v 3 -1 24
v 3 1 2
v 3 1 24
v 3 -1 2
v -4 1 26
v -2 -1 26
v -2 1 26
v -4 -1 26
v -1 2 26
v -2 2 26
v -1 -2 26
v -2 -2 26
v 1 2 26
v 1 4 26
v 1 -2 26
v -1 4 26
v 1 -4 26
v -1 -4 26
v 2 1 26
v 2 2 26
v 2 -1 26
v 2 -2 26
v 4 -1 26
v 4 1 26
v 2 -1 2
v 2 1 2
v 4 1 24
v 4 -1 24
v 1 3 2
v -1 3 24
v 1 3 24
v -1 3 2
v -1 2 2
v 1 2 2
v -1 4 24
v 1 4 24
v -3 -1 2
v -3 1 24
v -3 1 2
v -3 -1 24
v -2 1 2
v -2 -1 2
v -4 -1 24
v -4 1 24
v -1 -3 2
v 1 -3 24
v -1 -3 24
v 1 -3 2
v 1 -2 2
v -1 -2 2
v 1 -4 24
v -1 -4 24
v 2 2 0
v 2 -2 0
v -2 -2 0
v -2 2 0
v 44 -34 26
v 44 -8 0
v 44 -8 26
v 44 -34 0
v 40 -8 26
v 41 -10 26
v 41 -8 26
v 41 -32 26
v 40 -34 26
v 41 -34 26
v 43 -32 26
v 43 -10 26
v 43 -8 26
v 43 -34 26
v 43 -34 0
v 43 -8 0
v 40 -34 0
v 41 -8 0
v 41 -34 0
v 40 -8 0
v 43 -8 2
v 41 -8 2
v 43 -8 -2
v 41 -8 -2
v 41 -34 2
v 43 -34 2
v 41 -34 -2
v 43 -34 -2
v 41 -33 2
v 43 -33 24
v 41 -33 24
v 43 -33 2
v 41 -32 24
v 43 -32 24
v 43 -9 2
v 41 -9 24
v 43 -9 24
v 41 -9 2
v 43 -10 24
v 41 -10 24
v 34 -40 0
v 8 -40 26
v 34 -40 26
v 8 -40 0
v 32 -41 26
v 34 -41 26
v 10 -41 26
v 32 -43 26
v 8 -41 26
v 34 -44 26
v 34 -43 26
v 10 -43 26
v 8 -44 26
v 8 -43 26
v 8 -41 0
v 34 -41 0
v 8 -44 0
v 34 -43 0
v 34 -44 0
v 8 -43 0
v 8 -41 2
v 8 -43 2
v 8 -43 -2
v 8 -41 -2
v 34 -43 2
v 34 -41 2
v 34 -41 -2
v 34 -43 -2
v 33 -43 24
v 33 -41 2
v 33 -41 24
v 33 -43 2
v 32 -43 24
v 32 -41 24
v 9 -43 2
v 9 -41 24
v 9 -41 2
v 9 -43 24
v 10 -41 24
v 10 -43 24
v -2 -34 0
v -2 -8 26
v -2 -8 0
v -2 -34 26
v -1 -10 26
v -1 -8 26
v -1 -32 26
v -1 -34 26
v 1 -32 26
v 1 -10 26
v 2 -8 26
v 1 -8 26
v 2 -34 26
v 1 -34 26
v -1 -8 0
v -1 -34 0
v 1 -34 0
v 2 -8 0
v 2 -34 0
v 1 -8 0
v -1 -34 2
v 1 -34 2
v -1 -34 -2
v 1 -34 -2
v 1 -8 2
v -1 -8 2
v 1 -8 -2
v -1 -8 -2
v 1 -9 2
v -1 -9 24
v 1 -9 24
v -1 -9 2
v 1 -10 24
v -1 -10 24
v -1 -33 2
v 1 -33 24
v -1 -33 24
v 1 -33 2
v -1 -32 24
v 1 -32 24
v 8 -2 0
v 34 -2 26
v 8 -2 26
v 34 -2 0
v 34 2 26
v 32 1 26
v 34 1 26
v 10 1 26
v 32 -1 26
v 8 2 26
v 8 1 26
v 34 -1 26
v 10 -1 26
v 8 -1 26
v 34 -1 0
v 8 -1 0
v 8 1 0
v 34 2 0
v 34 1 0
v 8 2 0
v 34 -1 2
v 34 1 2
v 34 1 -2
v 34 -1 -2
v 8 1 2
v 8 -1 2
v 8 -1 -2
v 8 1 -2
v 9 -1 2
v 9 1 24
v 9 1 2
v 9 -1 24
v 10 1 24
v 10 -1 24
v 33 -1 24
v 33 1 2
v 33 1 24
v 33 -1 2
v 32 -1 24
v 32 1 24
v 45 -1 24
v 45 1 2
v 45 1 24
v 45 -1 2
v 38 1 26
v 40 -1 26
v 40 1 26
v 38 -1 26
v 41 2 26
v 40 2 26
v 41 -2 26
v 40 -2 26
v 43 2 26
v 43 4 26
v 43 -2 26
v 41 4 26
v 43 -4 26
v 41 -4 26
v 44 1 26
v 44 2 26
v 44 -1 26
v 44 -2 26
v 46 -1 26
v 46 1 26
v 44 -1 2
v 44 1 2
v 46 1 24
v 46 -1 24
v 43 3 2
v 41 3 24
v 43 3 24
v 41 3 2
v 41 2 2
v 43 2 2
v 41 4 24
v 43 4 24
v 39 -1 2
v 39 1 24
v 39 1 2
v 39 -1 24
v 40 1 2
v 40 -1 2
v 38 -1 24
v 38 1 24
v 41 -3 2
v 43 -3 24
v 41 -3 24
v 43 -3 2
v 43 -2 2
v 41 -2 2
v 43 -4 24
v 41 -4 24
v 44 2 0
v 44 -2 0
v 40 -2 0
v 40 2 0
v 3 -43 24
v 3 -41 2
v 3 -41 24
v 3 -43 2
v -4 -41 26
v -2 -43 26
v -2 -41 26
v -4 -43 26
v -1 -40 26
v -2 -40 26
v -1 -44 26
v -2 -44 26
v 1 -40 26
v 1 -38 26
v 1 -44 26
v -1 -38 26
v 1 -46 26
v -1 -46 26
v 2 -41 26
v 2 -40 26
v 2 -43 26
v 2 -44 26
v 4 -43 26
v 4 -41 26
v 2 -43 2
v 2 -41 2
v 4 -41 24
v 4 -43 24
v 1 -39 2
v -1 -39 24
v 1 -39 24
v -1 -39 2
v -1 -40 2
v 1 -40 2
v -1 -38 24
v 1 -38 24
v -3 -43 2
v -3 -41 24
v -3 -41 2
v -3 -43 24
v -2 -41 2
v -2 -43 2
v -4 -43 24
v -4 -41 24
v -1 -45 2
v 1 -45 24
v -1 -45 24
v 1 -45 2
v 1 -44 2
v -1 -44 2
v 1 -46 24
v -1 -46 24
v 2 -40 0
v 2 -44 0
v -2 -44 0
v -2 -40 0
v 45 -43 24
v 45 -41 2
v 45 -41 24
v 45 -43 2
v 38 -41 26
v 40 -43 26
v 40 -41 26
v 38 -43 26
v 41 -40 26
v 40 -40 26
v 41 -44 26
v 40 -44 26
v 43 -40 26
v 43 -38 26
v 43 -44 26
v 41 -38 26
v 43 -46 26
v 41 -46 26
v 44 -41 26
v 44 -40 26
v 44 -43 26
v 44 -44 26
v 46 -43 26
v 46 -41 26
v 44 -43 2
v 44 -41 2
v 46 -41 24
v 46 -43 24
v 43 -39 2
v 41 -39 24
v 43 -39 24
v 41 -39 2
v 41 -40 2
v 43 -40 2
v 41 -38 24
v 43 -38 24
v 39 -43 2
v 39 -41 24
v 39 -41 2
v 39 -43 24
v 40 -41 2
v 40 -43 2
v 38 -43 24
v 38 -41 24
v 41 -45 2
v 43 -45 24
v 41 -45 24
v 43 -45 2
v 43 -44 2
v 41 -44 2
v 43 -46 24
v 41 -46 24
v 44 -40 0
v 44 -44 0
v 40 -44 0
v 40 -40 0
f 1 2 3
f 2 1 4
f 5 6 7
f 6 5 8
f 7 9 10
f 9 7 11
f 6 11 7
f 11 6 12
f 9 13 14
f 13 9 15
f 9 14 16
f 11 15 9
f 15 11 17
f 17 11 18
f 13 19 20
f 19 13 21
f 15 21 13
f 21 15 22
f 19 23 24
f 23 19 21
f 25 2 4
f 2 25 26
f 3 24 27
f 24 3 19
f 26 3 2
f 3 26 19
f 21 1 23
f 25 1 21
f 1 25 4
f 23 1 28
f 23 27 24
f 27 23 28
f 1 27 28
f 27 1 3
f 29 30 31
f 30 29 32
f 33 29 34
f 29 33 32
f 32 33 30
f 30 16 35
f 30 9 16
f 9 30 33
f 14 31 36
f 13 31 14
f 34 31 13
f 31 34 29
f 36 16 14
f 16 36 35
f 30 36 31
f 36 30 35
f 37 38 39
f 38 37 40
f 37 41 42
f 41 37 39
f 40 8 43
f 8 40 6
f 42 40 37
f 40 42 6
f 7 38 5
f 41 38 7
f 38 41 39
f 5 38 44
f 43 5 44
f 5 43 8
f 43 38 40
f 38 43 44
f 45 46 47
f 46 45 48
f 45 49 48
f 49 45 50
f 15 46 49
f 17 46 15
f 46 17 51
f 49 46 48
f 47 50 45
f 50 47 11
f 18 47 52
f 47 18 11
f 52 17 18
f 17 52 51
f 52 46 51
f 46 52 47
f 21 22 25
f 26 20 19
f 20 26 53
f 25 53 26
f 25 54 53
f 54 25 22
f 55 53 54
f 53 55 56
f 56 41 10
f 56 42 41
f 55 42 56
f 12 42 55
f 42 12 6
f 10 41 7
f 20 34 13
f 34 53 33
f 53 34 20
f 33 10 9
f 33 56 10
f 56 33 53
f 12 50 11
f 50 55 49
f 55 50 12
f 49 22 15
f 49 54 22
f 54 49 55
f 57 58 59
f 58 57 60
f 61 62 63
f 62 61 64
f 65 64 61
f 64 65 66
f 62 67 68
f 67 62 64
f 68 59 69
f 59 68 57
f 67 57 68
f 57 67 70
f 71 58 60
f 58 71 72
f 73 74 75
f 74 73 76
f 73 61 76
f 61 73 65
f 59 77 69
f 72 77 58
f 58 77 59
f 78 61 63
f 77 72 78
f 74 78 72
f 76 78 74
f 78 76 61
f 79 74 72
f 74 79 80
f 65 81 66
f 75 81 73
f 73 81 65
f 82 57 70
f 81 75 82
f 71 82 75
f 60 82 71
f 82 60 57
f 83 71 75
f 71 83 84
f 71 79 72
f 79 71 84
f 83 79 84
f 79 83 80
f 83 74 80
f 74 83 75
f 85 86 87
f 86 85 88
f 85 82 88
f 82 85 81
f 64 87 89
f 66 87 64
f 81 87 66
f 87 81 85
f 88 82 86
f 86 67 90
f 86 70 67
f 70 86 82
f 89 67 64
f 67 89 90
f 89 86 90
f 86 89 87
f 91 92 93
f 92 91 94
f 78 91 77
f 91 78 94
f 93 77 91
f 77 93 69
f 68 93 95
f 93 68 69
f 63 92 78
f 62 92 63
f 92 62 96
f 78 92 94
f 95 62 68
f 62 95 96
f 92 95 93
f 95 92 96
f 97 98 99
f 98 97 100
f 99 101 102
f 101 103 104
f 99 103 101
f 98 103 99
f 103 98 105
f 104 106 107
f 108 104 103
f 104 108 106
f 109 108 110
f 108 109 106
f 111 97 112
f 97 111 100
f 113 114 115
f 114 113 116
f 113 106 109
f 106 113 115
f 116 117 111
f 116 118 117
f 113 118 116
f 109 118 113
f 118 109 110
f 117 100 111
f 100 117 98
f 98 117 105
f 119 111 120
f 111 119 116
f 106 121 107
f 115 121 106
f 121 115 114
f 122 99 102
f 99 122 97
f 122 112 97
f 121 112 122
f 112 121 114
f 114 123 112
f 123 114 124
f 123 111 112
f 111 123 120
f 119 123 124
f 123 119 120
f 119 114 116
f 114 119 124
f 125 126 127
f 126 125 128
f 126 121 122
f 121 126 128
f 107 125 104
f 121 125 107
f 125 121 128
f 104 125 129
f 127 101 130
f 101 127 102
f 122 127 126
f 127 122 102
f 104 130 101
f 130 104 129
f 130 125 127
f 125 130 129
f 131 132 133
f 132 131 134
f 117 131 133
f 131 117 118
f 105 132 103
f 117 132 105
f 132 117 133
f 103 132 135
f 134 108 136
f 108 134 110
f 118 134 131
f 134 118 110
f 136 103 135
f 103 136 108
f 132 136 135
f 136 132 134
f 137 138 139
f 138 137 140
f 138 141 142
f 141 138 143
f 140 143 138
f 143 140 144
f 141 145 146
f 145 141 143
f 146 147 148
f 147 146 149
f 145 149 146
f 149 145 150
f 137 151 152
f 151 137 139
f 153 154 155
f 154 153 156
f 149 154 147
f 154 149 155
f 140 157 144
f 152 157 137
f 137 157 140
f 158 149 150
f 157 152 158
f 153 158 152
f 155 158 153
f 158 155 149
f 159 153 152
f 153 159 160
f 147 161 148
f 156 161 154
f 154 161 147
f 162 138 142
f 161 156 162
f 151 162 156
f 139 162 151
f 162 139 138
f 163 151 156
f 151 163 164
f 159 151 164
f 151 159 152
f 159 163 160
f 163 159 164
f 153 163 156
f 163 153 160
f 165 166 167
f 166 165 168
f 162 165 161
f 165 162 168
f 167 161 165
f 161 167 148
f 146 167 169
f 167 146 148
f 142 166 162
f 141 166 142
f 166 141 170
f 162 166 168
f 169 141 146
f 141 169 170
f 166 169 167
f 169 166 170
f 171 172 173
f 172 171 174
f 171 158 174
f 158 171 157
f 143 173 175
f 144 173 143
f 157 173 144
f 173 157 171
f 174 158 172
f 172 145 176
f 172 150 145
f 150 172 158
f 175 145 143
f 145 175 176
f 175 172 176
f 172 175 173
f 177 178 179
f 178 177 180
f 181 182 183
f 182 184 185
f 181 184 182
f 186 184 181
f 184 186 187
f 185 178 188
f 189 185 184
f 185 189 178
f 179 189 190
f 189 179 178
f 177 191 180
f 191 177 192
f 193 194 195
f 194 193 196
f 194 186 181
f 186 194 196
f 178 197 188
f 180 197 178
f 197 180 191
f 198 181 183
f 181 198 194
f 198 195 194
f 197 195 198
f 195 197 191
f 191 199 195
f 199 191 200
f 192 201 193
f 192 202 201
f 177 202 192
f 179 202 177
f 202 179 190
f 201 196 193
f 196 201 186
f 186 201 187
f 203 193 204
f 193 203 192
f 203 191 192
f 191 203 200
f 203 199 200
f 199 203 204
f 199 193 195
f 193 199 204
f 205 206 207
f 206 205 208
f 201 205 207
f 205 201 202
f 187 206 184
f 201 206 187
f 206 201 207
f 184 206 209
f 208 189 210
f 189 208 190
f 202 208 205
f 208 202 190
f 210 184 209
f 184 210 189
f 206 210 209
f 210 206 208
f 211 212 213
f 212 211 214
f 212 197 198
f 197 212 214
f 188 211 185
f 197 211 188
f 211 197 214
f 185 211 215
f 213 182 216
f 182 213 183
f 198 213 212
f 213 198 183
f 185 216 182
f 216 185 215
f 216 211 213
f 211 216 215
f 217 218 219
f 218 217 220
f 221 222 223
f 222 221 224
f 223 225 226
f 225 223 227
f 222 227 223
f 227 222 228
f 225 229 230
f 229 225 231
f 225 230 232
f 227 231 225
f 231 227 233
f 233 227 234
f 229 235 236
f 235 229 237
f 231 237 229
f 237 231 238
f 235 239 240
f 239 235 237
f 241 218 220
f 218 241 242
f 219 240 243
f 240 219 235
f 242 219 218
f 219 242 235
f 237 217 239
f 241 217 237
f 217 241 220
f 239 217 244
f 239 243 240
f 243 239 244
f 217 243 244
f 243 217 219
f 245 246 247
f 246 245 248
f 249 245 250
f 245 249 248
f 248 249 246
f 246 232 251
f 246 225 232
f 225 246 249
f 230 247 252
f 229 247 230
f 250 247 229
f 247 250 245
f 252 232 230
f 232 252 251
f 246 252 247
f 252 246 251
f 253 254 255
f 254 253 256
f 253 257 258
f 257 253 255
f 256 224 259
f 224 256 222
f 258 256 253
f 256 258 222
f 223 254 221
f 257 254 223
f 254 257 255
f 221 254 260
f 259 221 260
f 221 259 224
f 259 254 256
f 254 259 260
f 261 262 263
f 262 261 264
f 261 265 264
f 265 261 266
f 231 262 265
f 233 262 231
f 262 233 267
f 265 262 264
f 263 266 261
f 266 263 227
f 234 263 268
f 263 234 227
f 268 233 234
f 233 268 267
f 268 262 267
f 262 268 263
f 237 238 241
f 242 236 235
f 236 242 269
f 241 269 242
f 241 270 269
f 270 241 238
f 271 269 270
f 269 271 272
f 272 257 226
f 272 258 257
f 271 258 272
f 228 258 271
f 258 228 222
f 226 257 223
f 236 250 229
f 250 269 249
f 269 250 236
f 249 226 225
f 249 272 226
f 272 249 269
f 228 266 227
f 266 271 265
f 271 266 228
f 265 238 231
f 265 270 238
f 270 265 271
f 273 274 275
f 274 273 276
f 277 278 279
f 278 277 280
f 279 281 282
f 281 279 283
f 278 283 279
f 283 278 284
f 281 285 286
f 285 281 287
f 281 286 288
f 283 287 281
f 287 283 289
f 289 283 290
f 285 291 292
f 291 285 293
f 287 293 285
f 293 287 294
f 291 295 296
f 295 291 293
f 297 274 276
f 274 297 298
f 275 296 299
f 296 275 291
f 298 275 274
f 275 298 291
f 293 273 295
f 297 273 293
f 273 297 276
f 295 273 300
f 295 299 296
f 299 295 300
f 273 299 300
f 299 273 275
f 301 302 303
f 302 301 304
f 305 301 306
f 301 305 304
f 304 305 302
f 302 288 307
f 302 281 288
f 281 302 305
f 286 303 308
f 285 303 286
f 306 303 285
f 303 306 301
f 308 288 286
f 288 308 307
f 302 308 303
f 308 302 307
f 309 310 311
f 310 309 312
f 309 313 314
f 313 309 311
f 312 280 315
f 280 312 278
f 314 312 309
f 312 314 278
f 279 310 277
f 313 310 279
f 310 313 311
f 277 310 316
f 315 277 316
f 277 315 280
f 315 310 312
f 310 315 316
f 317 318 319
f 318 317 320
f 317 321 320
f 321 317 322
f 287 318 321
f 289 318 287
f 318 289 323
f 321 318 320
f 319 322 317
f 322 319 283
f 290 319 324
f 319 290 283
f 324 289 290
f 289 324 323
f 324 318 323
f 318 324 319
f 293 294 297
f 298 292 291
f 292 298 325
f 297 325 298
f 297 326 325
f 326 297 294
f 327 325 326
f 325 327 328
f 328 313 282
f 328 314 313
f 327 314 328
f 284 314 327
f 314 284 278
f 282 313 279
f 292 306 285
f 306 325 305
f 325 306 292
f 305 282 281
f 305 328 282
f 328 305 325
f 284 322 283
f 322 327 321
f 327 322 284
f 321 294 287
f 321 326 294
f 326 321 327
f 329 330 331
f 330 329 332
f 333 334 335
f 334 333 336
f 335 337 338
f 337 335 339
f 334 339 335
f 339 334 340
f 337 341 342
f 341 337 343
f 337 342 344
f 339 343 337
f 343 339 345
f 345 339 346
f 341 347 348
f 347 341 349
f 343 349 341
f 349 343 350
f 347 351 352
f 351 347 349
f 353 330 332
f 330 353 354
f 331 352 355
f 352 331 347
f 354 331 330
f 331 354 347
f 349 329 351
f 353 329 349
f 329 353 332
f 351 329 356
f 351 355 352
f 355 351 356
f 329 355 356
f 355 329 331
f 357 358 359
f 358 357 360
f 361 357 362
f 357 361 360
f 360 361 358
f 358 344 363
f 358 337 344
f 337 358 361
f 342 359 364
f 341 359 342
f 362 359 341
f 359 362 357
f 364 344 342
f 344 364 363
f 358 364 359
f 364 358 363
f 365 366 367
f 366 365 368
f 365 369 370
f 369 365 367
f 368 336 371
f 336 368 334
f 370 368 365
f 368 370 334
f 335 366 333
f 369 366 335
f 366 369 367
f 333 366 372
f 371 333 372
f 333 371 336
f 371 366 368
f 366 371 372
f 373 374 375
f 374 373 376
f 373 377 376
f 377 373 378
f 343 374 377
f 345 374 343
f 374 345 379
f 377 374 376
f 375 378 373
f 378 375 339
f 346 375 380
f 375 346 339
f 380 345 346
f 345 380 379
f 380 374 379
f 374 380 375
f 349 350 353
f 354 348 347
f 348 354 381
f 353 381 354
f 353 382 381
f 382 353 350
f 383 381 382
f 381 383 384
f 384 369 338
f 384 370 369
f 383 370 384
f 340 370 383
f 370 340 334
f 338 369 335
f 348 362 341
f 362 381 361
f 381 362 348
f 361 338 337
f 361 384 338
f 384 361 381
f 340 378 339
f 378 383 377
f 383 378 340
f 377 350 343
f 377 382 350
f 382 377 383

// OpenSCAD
SEGHEIGHT=26;

// Interface for interlocking with walls
module subpost() {
	translate( v=[1,-1,2] ) union() {
		cube(size = [2,2,SEGHEIGHT-2]);
		translate( v=[1,0,SEGHEIGHT-4]) cube(size = [2,2,2]);
	}
}

// Post for connecting walls to.
module post() {
	union() {
		translate( v=[-2,-2,0]) cube(size = [4,4,SEGHEIGHT]);
		subpost();
		rotate(90) subpost();
		rotate(180) subpost();
		rotate(270) subpost();
	}
}

// Wall module. Designed for 26mm grid, with 4mm gaps between grid squares.
module wall() {
	difference() {
		translate( v=[-2,0,0]) union() {
			cube(size = [4,26,SEGHEIGHT]);
			translate( v = [1,0,-2])
				cube( size = [2,26,2] );
		}
		union() {
			translate( v=[0,-2,0]) post();
			translate( v=[0,28,0]) post();
		}

	}
}

post();

translate( v = [42 ,-34,0] ) wall();

translate ( v = [34,-42,0] ) rotate(90) wall();

rotate(180) translate ( v = [0,8,0] ) wall();

rotate(270) translate ( v = [0,8,0] ) wall();

translate( v = [ 42, 0, 0 ] ) post();

translate( v = [ 0, -42, 0] ) post();

translate( v = [42, -42, 0] ) post();
